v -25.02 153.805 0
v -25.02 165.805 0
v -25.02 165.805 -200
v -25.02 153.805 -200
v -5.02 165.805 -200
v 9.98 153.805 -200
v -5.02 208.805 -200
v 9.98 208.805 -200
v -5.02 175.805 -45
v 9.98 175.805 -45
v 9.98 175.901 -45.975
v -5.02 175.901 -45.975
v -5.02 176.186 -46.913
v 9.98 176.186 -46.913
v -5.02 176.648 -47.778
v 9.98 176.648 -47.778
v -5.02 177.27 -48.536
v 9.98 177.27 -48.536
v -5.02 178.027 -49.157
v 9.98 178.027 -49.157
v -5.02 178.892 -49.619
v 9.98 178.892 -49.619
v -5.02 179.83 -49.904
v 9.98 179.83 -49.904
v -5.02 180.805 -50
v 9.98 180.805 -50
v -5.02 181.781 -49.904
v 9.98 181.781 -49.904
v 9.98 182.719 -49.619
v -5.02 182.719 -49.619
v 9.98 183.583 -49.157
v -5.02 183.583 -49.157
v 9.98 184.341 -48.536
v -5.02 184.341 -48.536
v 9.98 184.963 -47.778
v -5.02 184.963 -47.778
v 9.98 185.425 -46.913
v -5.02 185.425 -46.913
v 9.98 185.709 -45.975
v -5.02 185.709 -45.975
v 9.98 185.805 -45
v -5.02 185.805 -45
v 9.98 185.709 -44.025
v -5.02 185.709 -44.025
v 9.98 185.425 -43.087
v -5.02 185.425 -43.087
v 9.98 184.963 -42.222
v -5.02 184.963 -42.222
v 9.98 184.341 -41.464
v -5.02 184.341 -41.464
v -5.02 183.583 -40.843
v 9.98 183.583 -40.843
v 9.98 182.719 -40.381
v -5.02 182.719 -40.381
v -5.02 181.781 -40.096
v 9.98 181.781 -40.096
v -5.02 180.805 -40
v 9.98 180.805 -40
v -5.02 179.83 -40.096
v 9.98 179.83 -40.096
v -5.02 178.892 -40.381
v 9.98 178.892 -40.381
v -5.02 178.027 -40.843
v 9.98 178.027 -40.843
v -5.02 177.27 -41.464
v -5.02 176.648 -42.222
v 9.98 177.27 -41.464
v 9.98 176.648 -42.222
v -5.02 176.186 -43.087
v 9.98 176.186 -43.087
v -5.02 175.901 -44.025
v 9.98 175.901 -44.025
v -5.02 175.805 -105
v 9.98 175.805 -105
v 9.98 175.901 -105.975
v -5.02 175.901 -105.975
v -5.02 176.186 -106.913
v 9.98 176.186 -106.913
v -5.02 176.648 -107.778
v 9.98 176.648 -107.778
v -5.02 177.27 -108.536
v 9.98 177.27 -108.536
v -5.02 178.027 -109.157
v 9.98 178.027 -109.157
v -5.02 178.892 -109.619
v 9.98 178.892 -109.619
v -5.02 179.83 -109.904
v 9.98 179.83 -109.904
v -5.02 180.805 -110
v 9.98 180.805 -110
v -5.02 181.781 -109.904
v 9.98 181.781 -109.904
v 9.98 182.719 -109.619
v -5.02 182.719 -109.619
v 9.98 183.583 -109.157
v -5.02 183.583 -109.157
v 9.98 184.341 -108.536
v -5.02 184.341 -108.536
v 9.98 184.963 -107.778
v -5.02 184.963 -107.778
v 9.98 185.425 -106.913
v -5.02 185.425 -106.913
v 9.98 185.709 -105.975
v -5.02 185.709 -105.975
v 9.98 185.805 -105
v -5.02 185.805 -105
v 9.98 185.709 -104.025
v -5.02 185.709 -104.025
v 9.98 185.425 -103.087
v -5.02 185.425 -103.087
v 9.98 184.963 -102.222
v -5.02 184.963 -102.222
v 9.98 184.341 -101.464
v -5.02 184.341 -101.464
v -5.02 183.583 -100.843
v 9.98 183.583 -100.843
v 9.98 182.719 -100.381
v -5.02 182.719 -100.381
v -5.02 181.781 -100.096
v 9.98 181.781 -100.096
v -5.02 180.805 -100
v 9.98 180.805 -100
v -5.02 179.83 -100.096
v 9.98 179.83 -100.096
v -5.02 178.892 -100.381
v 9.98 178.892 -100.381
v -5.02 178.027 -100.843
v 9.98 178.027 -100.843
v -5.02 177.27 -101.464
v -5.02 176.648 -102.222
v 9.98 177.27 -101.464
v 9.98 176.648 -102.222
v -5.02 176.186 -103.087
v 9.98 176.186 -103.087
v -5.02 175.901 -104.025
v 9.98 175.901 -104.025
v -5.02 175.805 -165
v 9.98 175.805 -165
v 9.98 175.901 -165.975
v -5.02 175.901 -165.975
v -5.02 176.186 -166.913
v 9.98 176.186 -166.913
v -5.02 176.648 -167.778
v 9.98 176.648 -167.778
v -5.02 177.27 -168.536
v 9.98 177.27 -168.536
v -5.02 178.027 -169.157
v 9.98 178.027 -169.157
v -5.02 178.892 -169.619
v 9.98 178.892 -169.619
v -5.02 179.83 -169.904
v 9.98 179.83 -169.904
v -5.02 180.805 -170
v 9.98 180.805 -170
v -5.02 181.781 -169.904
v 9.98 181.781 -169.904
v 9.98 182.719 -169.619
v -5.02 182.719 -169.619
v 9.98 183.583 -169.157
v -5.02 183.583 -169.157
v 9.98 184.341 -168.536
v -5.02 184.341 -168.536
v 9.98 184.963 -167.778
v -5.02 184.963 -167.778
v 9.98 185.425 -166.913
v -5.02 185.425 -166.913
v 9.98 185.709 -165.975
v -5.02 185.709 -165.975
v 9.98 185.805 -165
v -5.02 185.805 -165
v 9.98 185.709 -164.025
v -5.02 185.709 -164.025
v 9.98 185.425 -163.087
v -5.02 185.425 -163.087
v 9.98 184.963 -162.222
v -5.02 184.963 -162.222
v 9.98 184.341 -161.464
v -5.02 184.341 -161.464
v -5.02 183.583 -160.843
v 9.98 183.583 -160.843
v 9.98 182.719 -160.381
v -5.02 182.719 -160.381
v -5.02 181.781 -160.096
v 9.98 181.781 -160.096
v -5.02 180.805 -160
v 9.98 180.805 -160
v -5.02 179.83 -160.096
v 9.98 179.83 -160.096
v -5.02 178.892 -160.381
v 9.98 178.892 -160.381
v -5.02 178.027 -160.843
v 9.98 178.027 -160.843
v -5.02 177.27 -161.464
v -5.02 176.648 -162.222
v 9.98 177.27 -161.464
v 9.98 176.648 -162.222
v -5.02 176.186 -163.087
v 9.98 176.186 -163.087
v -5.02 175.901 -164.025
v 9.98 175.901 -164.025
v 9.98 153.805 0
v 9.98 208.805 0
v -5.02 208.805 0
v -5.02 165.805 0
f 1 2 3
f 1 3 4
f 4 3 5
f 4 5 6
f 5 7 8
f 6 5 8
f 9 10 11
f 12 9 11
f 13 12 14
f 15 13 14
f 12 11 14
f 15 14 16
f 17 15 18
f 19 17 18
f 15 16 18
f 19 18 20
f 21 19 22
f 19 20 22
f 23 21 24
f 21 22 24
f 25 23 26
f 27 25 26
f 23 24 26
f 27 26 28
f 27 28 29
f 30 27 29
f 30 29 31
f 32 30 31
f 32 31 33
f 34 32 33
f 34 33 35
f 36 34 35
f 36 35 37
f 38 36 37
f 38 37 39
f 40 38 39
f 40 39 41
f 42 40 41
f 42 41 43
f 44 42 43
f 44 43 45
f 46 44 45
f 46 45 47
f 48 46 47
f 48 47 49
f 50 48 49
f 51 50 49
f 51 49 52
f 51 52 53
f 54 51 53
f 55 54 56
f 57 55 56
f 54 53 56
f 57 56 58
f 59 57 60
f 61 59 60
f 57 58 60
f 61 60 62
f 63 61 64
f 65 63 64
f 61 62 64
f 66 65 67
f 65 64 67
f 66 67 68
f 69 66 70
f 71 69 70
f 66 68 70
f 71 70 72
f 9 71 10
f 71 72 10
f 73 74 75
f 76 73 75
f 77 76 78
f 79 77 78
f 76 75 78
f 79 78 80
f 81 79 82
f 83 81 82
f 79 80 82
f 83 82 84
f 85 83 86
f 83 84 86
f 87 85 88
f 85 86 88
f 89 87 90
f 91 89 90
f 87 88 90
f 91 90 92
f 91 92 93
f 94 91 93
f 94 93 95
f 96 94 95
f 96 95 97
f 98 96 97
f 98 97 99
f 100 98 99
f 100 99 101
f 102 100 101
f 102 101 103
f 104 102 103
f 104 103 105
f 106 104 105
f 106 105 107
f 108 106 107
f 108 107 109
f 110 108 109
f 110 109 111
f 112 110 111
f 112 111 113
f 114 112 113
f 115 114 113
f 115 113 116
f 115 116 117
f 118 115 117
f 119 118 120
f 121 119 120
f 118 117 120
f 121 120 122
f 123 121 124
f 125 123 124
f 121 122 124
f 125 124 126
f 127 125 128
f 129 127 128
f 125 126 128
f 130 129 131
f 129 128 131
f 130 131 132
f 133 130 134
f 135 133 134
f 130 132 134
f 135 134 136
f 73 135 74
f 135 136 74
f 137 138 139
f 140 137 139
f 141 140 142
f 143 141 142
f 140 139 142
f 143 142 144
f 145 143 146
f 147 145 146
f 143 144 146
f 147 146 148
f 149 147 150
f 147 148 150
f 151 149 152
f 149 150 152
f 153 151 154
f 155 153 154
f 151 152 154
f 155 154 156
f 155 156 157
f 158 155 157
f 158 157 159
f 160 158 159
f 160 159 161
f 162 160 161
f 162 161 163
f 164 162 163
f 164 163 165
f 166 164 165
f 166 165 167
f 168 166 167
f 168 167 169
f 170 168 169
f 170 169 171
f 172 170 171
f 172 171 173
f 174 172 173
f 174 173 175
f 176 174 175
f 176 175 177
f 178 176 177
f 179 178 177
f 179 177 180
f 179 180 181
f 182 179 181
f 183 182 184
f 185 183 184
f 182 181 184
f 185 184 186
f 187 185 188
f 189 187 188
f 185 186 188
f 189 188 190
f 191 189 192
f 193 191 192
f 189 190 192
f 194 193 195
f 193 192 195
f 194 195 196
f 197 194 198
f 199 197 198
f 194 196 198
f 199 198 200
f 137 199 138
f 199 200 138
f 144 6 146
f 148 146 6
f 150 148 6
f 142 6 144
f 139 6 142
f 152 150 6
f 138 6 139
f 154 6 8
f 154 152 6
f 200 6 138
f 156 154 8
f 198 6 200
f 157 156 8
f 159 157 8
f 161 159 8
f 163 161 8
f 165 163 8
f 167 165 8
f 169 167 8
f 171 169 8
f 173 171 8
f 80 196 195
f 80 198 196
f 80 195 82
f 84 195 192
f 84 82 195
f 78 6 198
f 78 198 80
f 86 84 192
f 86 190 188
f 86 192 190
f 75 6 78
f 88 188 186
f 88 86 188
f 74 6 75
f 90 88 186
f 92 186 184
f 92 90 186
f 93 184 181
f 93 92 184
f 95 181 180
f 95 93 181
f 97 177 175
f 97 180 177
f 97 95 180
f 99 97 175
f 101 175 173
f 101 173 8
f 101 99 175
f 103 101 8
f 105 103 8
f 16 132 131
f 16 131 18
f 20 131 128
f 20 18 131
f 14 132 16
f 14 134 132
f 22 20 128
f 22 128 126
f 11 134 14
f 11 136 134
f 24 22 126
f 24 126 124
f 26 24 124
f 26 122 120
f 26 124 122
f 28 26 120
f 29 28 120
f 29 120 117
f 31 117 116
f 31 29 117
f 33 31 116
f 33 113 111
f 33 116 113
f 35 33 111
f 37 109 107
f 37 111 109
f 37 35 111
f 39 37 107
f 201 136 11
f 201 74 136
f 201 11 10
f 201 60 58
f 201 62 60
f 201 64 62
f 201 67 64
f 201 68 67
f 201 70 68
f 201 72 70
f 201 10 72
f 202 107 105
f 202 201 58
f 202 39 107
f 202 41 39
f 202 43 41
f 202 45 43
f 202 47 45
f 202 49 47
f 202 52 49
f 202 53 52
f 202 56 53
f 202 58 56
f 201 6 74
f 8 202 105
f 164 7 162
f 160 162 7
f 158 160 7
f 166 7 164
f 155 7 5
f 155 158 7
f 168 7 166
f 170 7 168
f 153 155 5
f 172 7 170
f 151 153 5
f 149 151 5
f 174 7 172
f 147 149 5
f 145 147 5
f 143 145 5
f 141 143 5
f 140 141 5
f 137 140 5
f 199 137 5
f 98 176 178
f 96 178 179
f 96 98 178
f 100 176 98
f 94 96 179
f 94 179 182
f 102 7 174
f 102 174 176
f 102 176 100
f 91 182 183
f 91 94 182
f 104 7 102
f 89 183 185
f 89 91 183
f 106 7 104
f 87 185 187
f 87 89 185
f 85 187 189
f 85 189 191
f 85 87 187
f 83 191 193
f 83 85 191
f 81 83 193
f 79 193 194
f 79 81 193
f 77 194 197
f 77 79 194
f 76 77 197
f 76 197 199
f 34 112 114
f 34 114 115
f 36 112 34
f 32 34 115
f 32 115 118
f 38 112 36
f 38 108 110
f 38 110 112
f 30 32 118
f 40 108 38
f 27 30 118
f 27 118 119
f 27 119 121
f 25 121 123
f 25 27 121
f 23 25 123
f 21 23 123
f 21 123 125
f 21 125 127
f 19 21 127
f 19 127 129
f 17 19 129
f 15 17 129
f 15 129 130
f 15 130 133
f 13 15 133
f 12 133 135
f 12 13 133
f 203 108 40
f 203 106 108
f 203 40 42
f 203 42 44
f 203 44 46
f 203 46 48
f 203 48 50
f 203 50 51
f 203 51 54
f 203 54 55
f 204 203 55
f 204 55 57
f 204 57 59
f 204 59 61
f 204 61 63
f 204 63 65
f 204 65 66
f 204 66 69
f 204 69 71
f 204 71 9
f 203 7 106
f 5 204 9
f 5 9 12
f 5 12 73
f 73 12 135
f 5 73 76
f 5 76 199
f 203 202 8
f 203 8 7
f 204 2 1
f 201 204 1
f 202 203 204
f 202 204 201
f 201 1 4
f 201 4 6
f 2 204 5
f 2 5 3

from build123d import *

# Parameters (mm, degrees)
EXTRUDE_1_DEPTH                 = 200
CUT_EXTRUDE_1_REACH             = 293.247
SKETCH_2_R                      = 5
CUT_EXTRUDE_1_DIRECTION_2_DEPTH = 292.246667899


with BuildPart() as part:
    # 草圖1 → 填料-伸長1 (new body)
    with BuildSketch(Plane.XY):
        Polygon((-5.019605957, 208.805223982), (-5.019605957, 165.805223982), (-25.019605957, 165.805223982), (-25.019605957, 153.805223982), (9.980394043, 153.805223982), (9.980394043, 208.805223982), align=None)
    extrude(amount=-EXTRUDE_1_DEPTH)

    # 草圖2 → 除料-伸長1 (cut, up to next)
    with BuildSketch(Plane(origin=(9.980394043, 0, 0), x_dir=(0, 0, -1), z_dir=(1, 0, 0)), mode=Mode.PRIVATE) as cut_extrude_1_sk1:
        with Locations(Location((45, 180.805223982, 0), (0, 0, 270))):
            Circle(SKETCH_2_R)
    cut_extrude_1_tool1 = extrude(cut_extrude_1_sk1.sketch, amount=-CUT_EXTRUDE_1_REACH, mode=Mode.PRIVATE) & part.part
    # 草圖2 → 除料-伸長1 (cut, up to next)
    with BuildSketch(Plane(origin=(9.980394043, 0, 0), x_dir=(0, 0, -1), z_dir=(1, 0, 0)), mode=Mode.PRIVATE) as cut_extrude_1_sk2:
        with Locations(Location((105, 180.805223982, 0), (0, 0, 270))):
            Circle(SKETCH_2_R)
    cut_extrude_1_tool2 = extrude(cut_extrude_1_sk2.sketch, amount=-CUT_EXTRUDE_1_REACH, mode=Mode.PRIVATE) & part.part
    # 草圖2 → 除料-伸長1 (cut, up to next)
    with BuildSketch(Plane(origin=(9.980394043, 0, 0), x_dir=(0, 0, -1), z_dir=(1, 0, 0)), mode=Mode.PRIVATE) as cut_extrude_1_sk3:
        with Locations(Location((165, 180.805223982, 0), (0, 0, 270))):
            Circle(SKETCH_2_R)
    cut_extrude_1_tool3 = extrude(cut_extrude_1_sk3.sketch, amount=-CUT_EXTRUDE_1_REACH, mode=Mode.PRIVATE) & part.part
    add(cut_extrude_1_tool1.solids().sort_by_distance((9.980394, 180.805224, -45))[0], mode=Mode.SUBTRACT)
    add(cut_extrude_1_tool2.solids().sort_by_distance((9.980394, 180.805224, -105))[0], mode=Mode.SUBTRACT)
    add(cut_extrude_1_tool3.solids().sort_by_distance((9.980394, 180.805224, -165))[0], mode=Mode.SUBTRACT)

    # 草圖2 → 除料-伸長1 direction 2 (cut)
    with BuildSketch(Plane(origin=(9.980394043, 0, 0), x_dir=(0, 0, -1), z_dir=(1, 0, 0))):
        with Locations(Location((45, 180.805223982, 0), (0, 0, 270))):
            Circle(SKETCH_2_R)
        with Locations(Location((105, 180.805223982, 0), (0, 0, 270))):
            Circle(SKETCH_2_R)
        with Locations(Location((165, 180.805223982, 0), (0, 0, 270))):
            Circle(SKETCH_2_R)
    extrude(amount=CUT_EXTRUDE_1_DIRECTION_2_DEPTH, mode=Mode.SUBTRACT)


solid = part.part
